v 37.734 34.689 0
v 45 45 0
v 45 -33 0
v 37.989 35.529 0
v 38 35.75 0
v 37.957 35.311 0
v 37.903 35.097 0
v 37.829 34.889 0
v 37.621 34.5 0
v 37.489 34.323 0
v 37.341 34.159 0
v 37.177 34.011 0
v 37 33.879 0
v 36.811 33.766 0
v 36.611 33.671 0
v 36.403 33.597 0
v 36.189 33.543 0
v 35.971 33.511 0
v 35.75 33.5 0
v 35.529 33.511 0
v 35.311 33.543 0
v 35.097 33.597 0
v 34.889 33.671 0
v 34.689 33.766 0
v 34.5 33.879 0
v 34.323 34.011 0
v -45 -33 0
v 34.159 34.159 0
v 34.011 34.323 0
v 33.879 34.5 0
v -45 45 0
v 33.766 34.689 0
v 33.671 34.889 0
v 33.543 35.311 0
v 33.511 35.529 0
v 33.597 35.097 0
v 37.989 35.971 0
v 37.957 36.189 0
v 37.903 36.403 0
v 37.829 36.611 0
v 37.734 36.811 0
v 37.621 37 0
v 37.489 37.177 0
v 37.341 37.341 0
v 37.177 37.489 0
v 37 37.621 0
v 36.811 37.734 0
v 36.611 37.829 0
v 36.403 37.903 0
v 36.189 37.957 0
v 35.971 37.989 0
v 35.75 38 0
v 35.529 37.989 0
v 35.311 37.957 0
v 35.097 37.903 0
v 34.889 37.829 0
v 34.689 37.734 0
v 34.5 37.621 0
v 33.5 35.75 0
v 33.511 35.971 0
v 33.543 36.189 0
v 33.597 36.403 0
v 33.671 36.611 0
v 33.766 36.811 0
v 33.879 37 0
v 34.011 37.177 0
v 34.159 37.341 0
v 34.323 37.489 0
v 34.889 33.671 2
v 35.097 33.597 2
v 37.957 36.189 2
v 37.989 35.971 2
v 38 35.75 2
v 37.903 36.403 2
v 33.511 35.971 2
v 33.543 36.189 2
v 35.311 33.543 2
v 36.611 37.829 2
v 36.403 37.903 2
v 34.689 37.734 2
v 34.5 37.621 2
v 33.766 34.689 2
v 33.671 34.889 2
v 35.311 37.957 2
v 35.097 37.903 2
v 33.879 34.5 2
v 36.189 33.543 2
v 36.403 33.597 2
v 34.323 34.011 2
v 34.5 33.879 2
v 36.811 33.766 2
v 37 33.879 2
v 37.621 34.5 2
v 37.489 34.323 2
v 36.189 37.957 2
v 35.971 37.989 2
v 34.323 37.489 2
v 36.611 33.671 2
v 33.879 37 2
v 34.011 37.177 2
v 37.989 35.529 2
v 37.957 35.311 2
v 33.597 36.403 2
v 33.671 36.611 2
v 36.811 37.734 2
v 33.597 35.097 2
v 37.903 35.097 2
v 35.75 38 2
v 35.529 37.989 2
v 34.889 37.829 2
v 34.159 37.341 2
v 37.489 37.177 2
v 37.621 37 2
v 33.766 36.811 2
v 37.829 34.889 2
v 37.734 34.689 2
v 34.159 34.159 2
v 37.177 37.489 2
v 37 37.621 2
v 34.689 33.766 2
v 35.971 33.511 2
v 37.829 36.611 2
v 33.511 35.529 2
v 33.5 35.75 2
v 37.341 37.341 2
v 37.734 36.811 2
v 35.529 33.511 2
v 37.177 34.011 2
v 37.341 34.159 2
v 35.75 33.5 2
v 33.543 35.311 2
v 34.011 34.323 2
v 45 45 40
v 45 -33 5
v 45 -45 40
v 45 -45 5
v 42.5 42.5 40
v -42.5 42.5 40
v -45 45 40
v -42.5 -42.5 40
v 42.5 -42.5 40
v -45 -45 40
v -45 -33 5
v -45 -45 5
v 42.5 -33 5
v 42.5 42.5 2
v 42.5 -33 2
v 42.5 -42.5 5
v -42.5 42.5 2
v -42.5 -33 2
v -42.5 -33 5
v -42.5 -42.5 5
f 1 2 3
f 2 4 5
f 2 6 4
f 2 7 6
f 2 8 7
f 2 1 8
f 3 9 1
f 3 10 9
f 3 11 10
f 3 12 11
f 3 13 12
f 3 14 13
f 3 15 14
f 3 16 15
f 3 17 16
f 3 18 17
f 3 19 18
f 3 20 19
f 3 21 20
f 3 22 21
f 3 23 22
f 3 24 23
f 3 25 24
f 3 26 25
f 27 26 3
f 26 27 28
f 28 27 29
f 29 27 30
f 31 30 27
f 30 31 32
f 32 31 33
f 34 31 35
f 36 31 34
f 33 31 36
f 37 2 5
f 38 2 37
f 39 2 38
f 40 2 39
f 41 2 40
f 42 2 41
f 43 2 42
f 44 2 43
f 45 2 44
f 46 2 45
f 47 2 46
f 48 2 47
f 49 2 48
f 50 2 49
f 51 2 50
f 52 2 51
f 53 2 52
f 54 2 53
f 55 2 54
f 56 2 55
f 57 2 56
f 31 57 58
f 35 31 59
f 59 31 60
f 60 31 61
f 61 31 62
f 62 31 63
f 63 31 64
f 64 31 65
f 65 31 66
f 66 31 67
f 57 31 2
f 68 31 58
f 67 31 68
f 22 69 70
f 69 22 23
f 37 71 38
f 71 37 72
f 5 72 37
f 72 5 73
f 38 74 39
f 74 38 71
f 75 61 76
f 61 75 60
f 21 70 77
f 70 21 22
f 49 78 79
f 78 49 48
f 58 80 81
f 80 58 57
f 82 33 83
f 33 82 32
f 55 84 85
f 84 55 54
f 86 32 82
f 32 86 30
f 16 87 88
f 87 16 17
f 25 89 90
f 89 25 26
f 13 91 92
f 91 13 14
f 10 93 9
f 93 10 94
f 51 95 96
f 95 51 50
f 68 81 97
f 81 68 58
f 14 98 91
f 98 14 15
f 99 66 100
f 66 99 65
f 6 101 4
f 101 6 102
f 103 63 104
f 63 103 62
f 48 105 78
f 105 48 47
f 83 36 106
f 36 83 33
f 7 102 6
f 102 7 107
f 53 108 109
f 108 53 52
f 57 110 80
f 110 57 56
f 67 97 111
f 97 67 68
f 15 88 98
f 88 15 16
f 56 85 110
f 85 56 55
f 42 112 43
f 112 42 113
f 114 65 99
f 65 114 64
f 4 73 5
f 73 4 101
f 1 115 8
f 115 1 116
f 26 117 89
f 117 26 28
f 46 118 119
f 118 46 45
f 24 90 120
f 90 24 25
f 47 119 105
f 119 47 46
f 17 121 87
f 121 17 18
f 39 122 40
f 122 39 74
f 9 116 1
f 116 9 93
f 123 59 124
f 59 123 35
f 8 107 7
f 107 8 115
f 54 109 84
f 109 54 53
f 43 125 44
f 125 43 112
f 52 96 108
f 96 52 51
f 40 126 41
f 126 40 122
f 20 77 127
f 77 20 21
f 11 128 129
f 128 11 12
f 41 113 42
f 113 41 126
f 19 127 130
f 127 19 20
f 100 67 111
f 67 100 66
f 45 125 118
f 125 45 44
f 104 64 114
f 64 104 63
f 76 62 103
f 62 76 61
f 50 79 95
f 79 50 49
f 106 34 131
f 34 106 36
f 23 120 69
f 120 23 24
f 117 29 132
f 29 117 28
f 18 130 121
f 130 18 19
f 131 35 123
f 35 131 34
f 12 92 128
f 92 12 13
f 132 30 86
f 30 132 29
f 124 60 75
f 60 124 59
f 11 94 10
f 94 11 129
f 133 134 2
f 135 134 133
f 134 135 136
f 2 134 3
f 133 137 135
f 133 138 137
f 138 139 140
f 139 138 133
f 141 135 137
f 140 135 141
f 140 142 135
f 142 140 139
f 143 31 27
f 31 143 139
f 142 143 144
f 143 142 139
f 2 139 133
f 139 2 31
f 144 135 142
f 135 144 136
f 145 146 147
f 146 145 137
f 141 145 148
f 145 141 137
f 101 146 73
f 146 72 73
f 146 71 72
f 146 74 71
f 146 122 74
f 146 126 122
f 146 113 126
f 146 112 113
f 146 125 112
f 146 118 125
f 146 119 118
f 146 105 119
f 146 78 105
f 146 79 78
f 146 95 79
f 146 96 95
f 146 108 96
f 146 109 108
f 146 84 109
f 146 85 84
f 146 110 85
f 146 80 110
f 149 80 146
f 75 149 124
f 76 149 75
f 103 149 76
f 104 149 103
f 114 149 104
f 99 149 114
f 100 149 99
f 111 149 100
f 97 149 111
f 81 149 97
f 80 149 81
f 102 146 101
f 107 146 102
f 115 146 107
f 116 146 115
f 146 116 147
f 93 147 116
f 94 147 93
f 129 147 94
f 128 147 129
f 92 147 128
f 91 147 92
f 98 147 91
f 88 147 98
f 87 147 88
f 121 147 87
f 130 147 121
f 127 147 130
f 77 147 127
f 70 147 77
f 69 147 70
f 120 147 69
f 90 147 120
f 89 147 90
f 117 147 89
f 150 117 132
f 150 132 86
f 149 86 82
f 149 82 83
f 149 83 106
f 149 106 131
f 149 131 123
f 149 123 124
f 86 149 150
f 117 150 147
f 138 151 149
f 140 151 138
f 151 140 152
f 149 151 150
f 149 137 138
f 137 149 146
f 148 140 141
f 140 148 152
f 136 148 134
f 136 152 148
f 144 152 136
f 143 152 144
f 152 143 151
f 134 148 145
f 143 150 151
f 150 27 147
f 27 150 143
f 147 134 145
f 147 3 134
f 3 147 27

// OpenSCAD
// Magnetic stirrer housing for an 80 mm PC case fan
// Print orientation: top plate on bed (z = 0), walls rise to z = 40, open top

// ---------- Parameters ----------
top_thickness      = 2;     // top plate thickness
wall_thickness     = 2.5;   // wall thickness
box_height         = 40;    // total height of walls from top plate
outer_size         = 90;    // outer X and Y size of box
hole_count         = 4;     // number of screw holes in top plate
hole_size          = 4.5;   // screw hole diameter (M4)
hole_pitch         = 71.5;  // square pattern pitch for holes
cable_notch_w      = 12;    // cable notch width
cable_notch_depth  = 8;     // notch depth from open edge (z = 32 to 40)
eps                = 0.5;   // overcut for clean boolean differences

$fn = 64;

// ---------- Derived ----------
inner_size = outer_size - 2 * wall_thickness;   // 85 x 85
floor_z    = top_thickness;                     // z = 2, floor of open box

// ---------- Model ----------
difference() {
    // Solid block: top plate + walls
    translate([-outer_size/2, -outer_size/2, 0])
        cube([outer_size, outer_size, box_height]);

    // Open top (box empty above floor_z)
    translate([-inner_size/2, -inner_size/2, floor_z])
        cube([inner_size, inner_size, box_height - floor_z + eps]);

    // Screw holes in top plate, centred on plate
    for (i = [0 : hole_count - 1]) {
        a = hole_pitch * (i - (hole_count - 1) / 2);
        translate([a, a, 0])
            cylinder(d = hole_size, h = top_thickness + eps);
    }

    // Cable notch in one wall, centred along the wall, full depth
    translate([-outer_size/2, -outer_size/2, floor_z + wall_thickness - cable_notch_depth])
        cube([outer_size, cable_notch_w, cable_notch_depth + eps]);
}
